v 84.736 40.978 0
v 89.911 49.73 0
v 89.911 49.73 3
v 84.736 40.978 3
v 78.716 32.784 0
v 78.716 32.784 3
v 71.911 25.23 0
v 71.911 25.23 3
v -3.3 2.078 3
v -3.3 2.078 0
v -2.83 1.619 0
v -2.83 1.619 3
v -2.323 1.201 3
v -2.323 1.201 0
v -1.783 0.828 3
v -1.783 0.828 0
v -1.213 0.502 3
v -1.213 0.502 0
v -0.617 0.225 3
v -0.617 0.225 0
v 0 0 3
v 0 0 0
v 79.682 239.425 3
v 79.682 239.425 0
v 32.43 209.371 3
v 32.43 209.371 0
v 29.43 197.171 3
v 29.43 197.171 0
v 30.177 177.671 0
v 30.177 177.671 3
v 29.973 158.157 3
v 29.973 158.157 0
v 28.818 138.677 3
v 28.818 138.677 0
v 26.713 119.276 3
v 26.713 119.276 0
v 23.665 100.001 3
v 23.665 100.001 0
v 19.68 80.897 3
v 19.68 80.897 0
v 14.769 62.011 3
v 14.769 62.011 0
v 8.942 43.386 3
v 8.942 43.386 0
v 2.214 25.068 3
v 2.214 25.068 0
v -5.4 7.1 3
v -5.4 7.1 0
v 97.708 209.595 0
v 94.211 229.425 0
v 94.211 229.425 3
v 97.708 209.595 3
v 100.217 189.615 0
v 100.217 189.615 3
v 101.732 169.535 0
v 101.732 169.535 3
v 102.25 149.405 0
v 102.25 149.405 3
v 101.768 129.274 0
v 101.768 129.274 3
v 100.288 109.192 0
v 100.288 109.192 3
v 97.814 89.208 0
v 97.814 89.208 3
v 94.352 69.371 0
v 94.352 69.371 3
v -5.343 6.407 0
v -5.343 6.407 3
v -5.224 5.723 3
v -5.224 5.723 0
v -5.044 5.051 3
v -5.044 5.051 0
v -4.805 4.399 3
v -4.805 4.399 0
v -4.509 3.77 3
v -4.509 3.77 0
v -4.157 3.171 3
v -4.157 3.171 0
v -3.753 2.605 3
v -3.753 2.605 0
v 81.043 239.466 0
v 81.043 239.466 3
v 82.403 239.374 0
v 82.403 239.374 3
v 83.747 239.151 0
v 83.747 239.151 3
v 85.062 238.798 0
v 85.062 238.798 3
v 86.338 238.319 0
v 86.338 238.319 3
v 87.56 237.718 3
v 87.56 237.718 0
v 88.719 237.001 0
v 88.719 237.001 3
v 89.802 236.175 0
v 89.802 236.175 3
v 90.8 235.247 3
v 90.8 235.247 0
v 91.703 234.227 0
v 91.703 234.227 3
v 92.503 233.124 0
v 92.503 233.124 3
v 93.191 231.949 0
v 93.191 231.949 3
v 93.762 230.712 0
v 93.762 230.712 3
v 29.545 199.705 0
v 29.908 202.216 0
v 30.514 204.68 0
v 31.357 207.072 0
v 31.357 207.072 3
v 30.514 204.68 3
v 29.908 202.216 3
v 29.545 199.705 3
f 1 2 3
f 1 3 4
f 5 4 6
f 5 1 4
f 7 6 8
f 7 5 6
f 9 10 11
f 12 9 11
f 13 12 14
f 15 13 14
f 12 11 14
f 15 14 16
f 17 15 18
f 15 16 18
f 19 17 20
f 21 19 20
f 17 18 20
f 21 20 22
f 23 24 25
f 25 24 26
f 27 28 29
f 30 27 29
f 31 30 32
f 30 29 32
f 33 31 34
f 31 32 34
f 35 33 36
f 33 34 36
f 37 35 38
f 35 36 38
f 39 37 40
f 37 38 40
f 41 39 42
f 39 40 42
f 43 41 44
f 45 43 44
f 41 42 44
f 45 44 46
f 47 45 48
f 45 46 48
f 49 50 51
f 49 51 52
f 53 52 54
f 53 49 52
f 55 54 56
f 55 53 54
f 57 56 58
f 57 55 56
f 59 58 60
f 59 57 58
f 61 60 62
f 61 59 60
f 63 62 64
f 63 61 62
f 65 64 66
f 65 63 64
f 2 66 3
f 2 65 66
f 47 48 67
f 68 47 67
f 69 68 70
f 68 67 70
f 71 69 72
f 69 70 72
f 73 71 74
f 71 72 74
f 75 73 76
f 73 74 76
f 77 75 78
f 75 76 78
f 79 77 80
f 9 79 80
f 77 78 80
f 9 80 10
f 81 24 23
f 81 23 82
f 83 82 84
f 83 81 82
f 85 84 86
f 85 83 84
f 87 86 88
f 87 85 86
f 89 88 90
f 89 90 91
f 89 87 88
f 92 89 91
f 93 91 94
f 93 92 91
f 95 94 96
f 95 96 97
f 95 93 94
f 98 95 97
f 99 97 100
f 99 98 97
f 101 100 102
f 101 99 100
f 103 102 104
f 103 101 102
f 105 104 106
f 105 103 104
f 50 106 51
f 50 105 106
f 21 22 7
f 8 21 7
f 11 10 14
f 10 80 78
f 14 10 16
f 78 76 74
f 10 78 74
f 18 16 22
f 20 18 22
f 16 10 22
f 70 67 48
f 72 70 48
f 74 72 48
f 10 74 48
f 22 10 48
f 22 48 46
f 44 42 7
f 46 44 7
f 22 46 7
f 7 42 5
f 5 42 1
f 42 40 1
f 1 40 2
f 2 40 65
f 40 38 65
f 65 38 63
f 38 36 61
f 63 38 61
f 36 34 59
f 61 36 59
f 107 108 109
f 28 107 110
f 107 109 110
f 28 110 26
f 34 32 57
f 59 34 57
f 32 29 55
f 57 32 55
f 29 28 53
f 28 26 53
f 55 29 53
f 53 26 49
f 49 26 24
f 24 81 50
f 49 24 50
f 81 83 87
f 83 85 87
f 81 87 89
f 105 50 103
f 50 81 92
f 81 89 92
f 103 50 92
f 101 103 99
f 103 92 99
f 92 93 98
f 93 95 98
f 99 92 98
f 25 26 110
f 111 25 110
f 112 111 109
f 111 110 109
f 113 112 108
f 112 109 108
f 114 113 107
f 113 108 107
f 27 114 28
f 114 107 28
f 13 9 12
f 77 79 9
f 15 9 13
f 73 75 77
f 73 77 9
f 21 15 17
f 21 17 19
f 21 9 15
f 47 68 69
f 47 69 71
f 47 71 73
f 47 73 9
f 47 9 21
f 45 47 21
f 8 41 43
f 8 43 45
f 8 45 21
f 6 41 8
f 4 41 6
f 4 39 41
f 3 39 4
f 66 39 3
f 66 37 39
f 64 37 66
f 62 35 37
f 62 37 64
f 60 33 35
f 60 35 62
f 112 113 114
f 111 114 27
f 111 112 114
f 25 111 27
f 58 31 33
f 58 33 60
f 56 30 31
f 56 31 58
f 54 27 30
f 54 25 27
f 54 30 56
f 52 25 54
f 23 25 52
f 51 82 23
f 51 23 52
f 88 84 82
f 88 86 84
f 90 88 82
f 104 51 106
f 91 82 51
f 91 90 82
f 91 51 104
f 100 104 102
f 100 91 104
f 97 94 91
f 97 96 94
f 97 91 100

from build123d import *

# Parameters (mm, degrees)
EXTRUDE_1_DEPTH = 3


with BuildPart() as part:
    # Эскиз1 → Бобышка-Вытянуть1 (new body)
    with BuildSketch(Plane.XY):
        with BuildLine():
            ThreePointArc((71.910596806, 25.230232233), (89.617789367, 131.826316673), (79.68159846, 239.425303641))
            Line((79.68159846, 239.425303641), (32.429608738, 209.371194648))
            ThreePointArc((32.429608738, 209.371194648), (31.080732298, 102.87778502), (-3.3, 2.07782962))
            ThreePointArc((-3.3, 2.07782962), (-1.782749379, 0.828082821), (0, 0))
            Line((0, 0), (71.910596806, 25.230232233))
        make_face()
        with BuildLine():
            ThreePointArc((-3.3, 2.07782962), (31.080732298, 102.87778502), (32.429608738, 209.371194648))
            ThreePointArc((32.429608738, 209.371194648), (30.180601525, 203.45537675), (29.429608738, 197.171194648))
            ThreePointArc((29.429608738, 197.171194648), (23.664975471, 100.000760944), (-5.4, 7.1))
            ThreePointArc((-5.4, 7.1), (-4.805172006, 4.398586498), (-3.3, 2.07782962))
        make_face()
        with BuildLine():
            ThreePointArc((79.68159846, 239.425303641), (88.718866692, 237.000959513), (94.210596806, 229.425303641))
            ThreePointArc((94.210596806, 229.425303641), (102.133781486, 139.336722404), (89.910596806, 49.730232233))
            ThreePointArc((89.910596806, 49.730232233), (81.828404444, 36.80592458), (71.910596806, 25.230232233))
            ThreePointArc((71.910596806, 25.230232233), (89.617789367, 131.826316673), (79.68159846, 239.425303641))
        make_face()
    extrude(amount=EXTRUDE_1_DEPTH)


solid = part.part
